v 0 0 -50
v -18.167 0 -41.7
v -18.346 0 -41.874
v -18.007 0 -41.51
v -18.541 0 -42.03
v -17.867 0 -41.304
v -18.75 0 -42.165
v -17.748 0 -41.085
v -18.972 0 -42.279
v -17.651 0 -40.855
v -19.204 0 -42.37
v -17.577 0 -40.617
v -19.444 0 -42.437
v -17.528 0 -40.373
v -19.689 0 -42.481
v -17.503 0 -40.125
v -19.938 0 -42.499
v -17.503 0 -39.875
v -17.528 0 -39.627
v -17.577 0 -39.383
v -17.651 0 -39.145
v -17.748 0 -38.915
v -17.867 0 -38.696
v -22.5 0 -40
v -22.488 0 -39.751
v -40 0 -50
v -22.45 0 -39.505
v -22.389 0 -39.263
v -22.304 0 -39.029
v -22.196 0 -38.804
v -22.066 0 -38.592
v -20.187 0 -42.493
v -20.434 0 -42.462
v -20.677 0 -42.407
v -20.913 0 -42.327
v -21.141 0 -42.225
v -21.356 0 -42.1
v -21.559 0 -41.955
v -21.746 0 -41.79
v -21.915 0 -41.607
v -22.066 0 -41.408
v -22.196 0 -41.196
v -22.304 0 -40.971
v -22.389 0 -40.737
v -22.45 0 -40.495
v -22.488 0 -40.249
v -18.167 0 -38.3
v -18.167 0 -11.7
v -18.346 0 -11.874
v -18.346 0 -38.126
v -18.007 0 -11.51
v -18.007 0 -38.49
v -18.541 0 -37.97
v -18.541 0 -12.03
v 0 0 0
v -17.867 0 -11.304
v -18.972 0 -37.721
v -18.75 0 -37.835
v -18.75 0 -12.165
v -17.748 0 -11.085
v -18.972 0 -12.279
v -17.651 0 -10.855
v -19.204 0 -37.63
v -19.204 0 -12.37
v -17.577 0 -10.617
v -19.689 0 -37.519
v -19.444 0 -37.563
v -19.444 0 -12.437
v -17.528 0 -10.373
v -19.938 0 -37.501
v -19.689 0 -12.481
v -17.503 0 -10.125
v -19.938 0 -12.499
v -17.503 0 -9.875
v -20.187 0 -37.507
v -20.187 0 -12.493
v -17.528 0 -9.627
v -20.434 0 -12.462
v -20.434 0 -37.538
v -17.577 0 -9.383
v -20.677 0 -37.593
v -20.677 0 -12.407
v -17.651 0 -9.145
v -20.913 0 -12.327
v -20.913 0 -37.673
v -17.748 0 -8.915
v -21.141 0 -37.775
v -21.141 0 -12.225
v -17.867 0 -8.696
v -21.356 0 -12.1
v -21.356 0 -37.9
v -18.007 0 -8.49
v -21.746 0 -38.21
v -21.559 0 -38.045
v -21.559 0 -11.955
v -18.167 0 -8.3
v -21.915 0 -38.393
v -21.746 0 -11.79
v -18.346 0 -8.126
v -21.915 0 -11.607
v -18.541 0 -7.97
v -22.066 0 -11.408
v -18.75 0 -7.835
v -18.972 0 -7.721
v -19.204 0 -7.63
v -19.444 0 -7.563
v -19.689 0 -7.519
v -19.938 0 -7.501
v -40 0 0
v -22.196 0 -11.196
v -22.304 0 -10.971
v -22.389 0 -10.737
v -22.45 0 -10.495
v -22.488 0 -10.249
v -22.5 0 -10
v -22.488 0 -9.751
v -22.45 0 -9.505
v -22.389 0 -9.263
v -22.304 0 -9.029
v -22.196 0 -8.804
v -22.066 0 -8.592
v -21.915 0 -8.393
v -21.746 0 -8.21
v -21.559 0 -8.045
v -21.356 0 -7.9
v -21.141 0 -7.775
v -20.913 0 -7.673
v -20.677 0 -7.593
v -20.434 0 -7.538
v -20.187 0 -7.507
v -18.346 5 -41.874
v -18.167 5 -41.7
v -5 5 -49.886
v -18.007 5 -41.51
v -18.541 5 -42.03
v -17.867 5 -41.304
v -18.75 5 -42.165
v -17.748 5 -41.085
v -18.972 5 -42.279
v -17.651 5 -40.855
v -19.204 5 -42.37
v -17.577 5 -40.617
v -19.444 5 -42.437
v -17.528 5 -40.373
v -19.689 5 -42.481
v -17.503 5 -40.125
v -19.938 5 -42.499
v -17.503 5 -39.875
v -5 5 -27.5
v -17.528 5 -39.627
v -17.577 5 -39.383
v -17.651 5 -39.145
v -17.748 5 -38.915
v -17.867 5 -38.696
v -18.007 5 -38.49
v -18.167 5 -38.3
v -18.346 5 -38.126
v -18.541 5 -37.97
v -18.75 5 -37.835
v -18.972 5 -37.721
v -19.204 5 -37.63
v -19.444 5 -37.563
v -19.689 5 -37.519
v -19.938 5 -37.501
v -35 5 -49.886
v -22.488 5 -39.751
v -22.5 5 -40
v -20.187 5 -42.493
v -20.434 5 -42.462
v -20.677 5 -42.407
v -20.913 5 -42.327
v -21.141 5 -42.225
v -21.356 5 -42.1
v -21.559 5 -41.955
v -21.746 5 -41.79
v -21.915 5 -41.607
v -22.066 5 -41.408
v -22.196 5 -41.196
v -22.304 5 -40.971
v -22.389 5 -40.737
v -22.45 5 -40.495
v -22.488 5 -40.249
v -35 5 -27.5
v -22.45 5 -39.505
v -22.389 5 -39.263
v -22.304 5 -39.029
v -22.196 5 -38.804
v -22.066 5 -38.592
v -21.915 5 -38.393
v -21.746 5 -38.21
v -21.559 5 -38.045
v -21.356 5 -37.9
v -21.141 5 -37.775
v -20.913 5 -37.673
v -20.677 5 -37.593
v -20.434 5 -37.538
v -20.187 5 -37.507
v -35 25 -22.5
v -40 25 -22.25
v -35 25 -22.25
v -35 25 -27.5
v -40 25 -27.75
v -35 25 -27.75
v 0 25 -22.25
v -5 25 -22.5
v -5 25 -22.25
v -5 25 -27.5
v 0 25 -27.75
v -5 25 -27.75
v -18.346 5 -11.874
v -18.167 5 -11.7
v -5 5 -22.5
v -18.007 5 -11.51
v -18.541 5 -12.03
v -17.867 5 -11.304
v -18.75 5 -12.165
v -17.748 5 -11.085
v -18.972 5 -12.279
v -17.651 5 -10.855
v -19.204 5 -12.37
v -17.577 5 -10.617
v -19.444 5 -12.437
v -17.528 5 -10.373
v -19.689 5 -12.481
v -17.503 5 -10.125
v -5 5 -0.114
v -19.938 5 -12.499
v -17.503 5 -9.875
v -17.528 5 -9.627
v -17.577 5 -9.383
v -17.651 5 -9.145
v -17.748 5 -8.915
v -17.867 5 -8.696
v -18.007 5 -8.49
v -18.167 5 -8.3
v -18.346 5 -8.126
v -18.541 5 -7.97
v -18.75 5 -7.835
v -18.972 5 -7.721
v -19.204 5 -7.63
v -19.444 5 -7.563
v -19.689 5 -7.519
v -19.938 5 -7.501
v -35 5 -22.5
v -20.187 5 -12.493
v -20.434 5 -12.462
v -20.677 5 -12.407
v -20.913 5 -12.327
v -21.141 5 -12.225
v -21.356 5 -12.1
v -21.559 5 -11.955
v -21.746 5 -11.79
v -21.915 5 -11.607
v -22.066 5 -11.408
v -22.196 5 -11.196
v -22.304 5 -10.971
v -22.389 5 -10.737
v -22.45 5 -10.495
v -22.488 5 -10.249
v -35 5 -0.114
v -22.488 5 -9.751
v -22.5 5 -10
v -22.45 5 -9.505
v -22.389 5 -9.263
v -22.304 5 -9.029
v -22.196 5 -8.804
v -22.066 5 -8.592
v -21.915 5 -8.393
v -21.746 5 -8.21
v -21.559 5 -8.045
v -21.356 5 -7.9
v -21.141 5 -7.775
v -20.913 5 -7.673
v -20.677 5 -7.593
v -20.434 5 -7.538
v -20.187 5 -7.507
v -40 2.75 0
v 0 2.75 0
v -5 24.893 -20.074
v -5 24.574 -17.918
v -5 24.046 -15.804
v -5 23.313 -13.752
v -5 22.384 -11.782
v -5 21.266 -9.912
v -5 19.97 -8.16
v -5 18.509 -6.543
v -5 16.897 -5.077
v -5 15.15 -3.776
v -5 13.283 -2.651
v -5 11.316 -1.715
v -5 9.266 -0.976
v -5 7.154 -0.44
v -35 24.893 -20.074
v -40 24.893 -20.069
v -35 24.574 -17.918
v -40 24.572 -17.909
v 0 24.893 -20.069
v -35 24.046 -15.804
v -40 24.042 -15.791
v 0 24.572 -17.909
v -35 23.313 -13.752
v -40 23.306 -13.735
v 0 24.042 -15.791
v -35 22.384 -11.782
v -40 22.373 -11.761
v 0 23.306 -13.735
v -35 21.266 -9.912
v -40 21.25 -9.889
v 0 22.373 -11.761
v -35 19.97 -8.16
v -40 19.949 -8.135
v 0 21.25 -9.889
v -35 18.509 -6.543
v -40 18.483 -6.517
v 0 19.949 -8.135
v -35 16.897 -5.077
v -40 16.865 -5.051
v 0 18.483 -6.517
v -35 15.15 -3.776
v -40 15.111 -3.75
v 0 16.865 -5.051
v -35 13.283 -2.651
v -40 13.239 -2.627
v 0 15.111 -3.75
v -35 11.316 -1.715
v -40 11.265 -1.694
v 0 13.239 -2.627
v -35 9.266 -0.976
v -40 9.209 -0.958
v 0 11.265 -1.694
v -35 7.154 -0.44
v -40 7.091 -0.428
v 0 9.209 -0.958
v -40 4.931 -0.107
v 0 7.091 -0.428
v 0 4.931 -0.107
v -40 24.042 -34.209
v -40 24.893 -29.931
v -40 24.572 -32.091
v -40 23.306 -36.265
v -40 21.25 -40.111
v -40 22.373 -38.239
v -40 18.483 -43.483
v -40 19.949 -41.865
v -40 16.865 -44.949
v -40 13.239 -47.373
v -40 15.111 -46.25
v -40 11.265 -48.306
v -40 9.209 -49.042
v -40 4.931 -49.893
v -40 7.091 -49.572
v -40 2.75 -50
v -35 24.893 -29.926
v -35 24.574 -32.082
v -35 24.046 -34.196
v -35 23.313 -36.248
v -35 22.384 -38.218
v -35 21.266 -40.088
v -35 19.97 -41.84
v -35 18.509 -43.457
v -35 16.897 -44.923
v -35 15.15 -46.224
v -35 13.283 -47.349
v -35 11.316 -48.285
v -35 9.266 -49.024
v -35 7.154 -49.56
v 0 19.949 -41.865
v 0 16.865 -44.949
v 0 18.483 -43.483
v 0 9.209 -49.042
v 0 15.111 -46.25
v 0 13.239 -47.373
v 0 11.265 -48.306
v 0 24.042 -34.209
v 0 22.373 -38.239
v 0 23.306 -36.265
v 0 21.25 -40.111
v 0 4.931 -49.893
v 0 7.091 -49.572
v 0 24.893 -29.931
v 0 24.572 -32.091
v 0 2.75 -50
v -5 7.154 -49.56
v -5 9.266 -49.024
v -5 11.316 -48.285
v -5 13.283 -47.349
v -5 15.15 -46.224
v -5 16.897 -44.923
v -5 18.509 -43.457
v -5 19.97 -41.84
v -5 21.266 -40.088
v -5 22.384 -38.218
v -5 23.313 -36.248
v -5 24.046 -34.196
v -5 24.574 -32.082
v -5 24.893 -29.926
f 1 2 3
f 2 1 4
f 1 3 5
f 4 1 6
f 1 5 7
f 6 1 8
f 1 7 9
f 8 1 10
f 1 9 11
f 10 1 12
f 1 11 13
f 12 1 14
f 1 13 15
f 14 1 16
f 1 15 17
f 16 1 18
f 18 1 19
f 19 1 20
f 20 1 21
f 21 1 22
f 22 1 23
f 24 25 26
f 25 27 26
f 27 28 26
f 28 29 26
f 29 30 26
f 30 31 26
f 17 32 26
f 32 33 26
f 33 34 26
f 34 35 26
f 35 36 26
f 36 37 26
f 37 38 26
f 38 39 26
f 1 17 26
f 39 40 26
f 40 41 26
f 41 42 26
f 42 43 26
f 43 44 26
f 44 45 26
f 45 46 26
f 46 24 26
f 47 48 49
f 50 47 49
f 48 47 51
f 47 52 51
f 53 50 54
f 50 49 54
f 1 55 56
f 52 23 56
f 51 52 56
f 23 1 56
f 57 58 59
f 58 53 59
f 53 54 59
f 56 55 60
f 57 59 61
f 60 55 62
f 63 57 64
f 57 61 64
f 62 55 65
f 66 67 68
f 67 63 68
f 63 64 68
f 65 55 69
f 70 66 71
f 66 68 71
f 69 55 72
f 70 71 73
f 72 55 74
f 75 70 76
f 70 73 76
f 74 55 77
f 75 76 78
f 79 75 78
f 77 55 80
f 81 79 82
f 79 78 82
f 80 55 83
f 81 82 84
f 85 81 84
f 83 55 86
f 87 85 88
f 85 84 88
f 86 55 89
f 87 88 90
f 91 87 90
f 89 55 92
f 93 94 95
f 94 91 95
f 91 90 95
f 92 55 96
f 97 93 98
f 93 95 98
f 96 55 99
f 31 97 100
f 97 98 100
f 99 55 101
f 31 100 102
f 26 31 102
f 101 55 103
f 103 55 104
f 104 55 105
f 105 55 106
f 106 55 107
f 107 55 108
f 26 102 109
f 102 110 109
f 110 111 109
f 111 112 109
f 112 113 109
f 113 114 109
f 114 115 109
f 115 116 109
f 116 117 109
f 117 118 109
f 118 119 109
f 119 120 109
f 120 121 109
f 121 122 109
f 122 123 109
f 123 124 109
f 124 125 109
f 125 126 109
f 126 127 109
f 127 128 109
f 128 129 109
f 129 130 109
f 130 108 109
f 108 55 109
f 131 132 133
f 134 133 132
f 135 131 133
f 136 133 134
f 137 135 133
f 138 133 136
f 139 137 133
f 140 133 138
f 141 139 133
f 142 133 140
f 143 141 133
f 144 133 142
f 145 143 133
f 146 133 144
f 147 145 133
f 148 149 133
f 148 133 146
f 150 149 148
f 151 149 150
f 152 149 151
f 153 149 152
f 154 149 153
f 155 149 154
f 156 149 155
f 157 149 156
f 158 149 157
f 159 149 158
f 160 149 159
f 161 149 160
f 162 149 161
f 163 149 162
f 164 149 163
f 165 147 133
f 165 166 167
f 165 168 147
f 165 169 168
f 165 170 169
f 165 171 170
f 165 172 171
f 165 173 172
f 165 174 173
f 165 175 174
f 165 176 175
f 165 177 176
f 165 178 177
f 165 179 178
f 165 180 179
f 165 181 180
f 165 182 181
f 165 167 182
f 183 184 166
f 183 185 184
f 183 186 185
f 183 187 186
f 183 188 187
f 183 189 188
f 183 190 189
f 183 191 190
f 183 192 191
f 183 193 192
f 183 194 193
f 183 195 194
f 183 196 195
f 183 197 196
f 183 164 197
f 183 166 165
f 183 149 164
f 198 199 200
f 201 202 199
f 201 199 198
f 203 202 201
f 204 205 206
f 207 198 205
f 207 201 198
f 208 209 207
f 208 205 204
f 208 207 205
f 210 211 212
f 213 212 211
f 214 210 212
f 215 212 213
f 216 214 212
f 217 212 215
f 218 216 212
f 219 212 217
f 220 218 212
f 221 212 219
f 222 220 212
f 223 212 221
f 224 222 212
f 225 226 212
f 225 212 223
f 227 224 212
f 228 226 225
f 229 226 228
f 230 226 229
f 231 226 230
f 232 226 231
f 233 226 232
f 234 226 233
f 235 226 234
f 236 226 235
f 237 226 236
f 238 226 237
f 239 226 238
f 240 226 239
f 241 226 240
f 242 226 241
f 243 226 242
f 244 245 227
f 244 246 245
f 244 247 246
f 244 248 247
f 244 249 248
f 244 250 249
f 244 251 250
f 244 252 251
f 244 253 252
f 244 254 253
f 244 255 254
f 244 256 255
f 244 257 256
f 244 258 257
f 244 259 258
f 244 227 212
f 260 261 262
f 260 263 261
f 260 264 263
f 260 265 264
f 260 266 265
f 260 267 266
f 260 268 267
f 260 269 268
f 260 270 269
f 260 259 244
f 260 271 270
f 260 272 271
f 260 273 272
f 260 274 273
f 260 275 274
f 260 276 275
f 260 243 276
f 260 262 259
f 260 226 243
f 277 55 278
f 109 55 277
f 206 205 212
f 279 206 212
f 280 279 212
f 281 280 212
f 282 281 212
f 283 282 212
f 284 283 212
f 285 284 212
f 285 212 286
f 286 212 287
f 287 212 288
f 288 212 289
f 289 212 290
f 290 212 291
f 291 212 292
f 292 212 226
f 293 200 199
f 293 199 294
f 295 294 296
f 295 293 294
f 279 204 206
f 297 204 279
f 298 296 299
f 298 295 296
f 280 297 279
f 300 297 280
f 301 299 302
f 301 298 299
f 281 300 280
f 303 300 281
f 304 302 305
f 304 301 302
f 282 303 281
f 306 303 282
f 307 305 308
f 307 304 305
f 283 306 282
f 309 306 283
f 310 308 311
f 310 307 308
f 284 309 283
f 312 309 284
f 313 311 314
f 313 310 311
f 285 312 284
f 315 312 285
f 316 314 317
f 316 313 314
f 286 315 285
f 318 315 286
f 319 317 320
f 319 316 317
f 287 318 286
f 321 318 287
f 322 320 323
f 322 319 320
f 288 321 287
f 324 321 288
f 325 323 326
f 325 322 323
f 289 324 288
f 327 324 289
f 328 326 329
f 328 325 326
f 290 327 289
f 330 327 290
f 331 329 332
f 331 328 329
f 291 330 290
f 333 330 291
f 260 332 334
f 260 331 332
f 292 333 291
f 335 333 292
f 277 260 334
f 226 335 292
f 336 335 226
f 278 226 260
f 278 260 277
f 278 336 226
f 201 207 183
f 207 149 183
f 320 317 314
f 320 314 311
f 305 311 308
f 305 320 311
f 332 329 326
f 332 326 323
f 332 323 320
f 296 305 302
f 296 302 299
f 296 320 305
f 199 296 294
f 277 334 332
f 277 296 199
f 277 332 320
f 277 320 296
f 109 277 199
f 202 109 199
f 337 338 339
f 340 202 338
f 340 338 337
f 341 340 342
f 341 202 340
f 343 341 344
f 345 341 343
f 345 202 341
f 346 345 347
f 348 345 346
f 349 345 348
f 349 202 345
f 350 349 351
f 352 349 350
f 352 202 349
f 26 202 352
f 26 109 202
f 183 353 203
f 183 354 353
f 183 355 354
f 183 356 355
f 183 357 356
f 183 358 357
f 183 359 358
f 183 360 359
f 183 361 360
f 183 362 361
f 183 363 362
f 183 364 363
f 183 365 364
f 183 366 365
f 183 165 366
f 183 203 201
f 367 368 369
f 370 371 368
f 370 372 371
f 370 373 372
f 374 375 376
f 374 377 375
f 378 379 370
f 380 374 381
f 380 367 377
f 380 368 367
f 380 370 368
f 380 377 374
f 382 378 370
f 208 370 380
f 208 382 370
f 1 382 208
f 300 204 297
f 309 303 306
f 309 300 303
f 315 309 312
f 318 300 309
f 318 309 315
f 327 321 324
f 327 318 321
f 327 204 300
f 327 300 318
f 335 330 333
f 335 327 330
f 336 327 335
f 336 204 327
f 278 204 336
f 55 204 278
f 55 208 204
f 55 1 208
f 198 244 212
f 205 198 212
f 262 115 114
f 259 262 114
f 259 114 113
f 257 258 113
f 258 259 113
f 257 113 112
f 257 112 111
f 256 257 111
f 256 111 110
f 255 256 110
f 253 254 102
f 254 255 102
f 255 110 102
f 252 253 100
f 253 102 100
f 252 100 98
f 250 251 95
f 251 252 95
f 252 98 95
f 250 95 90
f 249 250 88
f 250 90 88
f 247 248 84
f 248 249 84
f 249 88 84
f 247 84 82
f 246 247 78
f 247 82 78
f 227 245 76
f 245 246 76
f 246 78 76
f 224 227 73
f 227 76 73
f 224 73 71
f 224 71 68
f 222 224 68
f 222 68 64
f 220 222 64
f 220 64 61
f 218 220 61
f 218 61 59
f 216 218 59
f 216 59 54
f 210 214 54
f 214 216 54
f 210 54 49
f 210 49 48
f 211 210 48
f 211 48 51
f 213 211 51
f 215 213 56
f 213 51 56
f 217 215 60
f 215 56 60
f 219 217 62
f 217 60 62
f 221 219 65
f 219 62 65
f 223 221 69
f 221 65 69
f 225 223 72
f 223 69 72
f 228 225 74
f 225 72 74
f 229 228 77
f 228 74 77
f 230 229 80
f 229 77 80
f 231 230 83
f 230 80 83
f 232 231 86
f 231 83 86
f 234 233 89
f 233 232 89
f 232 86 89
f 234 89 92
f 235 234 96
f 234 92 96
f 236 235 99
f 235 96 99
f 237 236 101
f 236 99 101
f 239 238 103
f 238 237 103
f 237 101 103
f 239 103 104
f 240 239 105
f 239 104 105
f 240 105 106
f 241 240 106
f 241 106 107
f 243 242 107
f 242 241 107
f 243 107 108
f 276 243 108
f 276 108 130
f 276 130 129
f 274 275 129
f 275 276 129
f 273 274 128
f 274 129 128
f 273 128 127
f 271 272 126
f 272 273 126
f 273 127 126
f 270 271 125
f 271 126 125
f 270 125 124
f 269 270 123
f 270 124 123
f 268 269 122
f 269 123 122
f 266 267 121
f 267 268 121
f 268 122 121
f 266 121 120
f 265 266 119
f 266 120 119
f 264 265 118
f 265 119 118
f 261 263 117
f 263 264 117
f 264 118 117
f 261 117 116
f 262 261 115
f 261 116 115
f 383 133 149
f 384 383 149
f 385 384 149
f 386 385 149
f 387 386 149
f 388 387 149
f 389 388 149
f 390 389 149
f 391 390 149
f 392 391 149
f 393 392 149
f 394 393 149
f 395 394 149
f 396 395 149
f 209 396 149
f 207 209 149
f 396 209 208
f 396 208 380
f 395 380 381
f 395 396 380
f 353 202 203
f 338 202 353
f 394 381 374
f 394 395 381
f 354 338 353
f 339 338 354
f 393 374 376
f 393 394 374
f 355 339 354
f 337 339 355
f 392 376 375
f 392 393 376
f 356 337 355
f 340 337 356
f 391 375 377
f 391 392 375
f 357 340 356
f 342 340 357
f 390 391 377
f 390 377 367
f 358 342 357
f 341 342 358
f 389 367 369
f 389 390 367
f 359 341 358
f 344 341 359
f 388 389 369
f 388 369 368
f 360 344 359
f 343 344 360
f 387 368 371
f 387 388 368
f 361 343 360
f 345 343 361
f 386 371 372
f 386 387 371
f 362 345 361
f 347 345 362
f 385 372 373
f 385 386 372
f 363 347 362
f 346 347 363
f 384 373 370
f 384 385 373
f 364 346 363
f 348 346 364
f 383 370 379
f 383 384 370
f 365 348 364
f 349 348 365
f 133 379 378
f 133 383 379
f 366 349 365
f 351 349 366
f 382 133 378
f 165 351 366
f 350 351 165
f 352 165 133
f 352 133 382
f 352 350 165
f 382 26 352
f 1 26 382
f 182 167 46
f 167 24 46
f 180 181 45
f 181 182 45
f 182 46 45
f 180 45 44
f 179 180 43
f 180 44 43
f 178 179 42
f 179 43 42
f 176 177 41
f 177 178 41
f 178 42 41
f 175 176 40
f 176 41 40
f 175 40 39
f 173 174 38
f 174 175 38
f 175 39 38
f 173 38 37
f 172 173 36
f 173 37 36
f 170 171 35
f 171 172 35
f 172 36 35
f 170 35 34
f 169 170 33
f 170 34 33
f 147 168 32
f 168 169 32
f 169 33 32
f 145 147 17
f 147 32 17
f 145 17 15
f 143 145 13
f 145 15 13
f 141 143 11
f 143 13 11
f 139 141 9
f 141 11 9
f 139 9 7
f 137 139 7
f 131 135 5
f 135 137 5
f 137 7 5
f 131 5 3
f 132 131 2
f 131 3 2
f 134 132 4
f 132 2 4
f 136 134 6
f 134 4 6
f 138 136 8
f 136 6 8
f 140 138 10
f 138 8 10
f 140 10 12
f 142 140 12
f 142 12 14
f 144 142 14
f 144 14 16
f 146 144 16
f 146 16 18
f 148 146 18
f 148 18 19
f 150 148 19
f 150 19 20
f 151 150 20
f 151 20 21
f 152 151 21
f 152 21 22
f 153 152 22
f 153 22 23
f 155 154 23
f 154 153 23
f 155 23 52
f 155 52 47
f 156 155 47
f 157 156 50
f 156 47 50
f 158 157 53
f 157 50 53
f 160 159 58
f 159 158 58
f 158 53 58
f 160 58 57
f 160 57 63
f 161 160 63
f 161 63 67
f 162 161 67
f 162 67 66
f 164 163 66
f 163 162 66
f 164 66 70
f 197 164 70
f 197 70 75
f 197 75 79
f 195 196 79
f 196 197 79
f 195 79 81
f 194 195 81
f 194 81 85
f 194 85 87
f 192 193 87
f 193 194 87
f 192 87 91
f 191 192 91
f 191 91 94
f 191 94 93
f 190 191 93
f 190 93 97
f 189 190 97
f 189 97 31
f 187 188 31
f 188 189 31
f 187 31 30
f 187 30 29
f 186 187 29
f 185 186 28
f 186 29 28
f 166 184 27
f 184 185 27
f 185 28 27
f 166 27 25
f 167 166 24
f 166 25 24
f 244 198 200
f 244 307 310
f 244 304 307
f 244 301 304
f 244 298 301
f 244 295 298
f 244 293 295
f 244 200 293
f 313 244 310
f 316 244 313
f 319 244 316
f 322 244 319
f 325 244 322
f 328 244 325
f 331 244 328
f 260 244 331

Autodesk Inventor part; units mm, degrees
ref_plane "YZ Plane" through (0, 0, 0) normal (1, 0, 0) x (0, 1, 0)
ref_plane "XZ Plane" through (0, 0, 0) normal (0, 1, 0) x (-1, 0, 0)
ref_plane "XY Plane" through (0, 0, 0) normal (0, 0, 1) x (1, 0, 0)
sketch "Sketch1" plane through (0, 0, 0) normal (0, 1, 0) x (-1, 0, 0)
  line L0 (0, 0) -> (40, 0)
  line L1 (40, 0) -> (40, -50)
  line L2 (40, -50) -> (0, -50)
  line L3 (0, -50) -> (0, 0)
  circle A0 centre (20, -10) radius 2.5
  circle A1 centre (20, -40) radius 2.5
  dimension "d0" = 40
  dimension "d1" = 50
  dimension "d2" = 5
  dimension "d3" = 5
  dimension "d4" = 10
  dimension "d5" = 10
  dimension "d6" = 20
extrude "Extrusion1" add sketch "Sketch1" along normal blind 5
sketch "Sketch2" plane through (0, 5, 0) normal (0, 1, 0) x (1, 0, 0)
  line L0 (-40, 50) -> (-40, 0) projected
  line L1 (0, 0) -> (0, 50) projected
  line L2 (-40, 22.5) -> (0, 22.5)
  line L3 (0, 22.5) -> (0, 27.5)
  line L4 (0, 27.5) -> (-40, 27.5)
  line L5 (-40, 27.5) -> (-40, 22.5)
  line L6 (-40, 0) -> (0, 0) projected
  line L7 (0, 50) -> (-40, 50) projected
  line L8 (-40, 50) -> (-35, 50)
  line L9 (-35, 50) -> (-35, 0)
  line L10 (-35, 0) -> (-40, 0)
  line L11 (-40, 0) -> (-40, 50)
  line L12 (-5, 0) -> (0, 0)
  line L13 (0, 0) -> (0, 50)
  line L14 (0, 50) -> (-5, 50)
  line L15 (-5, 50) -> (-5, 0)
  point P0 (0, 22.5)
  point P1 (-5, 22.5)
  point P2 (-5, 27.5)
  point P3 (-35, 22.5)
  point P4 (-35, 27.5)
  dimension "d9" = 5
  dimension "d10" = 22.5
  dimension "d13" = 5
  dimension "d14" = 5
extrude "Extrusion2" add sketch "Sketch2" along normal blind 20 contours L7 L9 L4 L0 | L4 L9 L2 L0 | L2 L9 L6 L0 | L4 L15 L2 L9 | L7 L1 L4 L15 | L4 L1 L2 L15 | L2 L1 L6 L15
fillet "Fillet1" radius 22.25 4 edges at (-37.5, 25, 0) (-37.5, 25, -50) (-2.5, 25, -50) (-2.5, 25, 0)
properties part number "LightSensor01"
